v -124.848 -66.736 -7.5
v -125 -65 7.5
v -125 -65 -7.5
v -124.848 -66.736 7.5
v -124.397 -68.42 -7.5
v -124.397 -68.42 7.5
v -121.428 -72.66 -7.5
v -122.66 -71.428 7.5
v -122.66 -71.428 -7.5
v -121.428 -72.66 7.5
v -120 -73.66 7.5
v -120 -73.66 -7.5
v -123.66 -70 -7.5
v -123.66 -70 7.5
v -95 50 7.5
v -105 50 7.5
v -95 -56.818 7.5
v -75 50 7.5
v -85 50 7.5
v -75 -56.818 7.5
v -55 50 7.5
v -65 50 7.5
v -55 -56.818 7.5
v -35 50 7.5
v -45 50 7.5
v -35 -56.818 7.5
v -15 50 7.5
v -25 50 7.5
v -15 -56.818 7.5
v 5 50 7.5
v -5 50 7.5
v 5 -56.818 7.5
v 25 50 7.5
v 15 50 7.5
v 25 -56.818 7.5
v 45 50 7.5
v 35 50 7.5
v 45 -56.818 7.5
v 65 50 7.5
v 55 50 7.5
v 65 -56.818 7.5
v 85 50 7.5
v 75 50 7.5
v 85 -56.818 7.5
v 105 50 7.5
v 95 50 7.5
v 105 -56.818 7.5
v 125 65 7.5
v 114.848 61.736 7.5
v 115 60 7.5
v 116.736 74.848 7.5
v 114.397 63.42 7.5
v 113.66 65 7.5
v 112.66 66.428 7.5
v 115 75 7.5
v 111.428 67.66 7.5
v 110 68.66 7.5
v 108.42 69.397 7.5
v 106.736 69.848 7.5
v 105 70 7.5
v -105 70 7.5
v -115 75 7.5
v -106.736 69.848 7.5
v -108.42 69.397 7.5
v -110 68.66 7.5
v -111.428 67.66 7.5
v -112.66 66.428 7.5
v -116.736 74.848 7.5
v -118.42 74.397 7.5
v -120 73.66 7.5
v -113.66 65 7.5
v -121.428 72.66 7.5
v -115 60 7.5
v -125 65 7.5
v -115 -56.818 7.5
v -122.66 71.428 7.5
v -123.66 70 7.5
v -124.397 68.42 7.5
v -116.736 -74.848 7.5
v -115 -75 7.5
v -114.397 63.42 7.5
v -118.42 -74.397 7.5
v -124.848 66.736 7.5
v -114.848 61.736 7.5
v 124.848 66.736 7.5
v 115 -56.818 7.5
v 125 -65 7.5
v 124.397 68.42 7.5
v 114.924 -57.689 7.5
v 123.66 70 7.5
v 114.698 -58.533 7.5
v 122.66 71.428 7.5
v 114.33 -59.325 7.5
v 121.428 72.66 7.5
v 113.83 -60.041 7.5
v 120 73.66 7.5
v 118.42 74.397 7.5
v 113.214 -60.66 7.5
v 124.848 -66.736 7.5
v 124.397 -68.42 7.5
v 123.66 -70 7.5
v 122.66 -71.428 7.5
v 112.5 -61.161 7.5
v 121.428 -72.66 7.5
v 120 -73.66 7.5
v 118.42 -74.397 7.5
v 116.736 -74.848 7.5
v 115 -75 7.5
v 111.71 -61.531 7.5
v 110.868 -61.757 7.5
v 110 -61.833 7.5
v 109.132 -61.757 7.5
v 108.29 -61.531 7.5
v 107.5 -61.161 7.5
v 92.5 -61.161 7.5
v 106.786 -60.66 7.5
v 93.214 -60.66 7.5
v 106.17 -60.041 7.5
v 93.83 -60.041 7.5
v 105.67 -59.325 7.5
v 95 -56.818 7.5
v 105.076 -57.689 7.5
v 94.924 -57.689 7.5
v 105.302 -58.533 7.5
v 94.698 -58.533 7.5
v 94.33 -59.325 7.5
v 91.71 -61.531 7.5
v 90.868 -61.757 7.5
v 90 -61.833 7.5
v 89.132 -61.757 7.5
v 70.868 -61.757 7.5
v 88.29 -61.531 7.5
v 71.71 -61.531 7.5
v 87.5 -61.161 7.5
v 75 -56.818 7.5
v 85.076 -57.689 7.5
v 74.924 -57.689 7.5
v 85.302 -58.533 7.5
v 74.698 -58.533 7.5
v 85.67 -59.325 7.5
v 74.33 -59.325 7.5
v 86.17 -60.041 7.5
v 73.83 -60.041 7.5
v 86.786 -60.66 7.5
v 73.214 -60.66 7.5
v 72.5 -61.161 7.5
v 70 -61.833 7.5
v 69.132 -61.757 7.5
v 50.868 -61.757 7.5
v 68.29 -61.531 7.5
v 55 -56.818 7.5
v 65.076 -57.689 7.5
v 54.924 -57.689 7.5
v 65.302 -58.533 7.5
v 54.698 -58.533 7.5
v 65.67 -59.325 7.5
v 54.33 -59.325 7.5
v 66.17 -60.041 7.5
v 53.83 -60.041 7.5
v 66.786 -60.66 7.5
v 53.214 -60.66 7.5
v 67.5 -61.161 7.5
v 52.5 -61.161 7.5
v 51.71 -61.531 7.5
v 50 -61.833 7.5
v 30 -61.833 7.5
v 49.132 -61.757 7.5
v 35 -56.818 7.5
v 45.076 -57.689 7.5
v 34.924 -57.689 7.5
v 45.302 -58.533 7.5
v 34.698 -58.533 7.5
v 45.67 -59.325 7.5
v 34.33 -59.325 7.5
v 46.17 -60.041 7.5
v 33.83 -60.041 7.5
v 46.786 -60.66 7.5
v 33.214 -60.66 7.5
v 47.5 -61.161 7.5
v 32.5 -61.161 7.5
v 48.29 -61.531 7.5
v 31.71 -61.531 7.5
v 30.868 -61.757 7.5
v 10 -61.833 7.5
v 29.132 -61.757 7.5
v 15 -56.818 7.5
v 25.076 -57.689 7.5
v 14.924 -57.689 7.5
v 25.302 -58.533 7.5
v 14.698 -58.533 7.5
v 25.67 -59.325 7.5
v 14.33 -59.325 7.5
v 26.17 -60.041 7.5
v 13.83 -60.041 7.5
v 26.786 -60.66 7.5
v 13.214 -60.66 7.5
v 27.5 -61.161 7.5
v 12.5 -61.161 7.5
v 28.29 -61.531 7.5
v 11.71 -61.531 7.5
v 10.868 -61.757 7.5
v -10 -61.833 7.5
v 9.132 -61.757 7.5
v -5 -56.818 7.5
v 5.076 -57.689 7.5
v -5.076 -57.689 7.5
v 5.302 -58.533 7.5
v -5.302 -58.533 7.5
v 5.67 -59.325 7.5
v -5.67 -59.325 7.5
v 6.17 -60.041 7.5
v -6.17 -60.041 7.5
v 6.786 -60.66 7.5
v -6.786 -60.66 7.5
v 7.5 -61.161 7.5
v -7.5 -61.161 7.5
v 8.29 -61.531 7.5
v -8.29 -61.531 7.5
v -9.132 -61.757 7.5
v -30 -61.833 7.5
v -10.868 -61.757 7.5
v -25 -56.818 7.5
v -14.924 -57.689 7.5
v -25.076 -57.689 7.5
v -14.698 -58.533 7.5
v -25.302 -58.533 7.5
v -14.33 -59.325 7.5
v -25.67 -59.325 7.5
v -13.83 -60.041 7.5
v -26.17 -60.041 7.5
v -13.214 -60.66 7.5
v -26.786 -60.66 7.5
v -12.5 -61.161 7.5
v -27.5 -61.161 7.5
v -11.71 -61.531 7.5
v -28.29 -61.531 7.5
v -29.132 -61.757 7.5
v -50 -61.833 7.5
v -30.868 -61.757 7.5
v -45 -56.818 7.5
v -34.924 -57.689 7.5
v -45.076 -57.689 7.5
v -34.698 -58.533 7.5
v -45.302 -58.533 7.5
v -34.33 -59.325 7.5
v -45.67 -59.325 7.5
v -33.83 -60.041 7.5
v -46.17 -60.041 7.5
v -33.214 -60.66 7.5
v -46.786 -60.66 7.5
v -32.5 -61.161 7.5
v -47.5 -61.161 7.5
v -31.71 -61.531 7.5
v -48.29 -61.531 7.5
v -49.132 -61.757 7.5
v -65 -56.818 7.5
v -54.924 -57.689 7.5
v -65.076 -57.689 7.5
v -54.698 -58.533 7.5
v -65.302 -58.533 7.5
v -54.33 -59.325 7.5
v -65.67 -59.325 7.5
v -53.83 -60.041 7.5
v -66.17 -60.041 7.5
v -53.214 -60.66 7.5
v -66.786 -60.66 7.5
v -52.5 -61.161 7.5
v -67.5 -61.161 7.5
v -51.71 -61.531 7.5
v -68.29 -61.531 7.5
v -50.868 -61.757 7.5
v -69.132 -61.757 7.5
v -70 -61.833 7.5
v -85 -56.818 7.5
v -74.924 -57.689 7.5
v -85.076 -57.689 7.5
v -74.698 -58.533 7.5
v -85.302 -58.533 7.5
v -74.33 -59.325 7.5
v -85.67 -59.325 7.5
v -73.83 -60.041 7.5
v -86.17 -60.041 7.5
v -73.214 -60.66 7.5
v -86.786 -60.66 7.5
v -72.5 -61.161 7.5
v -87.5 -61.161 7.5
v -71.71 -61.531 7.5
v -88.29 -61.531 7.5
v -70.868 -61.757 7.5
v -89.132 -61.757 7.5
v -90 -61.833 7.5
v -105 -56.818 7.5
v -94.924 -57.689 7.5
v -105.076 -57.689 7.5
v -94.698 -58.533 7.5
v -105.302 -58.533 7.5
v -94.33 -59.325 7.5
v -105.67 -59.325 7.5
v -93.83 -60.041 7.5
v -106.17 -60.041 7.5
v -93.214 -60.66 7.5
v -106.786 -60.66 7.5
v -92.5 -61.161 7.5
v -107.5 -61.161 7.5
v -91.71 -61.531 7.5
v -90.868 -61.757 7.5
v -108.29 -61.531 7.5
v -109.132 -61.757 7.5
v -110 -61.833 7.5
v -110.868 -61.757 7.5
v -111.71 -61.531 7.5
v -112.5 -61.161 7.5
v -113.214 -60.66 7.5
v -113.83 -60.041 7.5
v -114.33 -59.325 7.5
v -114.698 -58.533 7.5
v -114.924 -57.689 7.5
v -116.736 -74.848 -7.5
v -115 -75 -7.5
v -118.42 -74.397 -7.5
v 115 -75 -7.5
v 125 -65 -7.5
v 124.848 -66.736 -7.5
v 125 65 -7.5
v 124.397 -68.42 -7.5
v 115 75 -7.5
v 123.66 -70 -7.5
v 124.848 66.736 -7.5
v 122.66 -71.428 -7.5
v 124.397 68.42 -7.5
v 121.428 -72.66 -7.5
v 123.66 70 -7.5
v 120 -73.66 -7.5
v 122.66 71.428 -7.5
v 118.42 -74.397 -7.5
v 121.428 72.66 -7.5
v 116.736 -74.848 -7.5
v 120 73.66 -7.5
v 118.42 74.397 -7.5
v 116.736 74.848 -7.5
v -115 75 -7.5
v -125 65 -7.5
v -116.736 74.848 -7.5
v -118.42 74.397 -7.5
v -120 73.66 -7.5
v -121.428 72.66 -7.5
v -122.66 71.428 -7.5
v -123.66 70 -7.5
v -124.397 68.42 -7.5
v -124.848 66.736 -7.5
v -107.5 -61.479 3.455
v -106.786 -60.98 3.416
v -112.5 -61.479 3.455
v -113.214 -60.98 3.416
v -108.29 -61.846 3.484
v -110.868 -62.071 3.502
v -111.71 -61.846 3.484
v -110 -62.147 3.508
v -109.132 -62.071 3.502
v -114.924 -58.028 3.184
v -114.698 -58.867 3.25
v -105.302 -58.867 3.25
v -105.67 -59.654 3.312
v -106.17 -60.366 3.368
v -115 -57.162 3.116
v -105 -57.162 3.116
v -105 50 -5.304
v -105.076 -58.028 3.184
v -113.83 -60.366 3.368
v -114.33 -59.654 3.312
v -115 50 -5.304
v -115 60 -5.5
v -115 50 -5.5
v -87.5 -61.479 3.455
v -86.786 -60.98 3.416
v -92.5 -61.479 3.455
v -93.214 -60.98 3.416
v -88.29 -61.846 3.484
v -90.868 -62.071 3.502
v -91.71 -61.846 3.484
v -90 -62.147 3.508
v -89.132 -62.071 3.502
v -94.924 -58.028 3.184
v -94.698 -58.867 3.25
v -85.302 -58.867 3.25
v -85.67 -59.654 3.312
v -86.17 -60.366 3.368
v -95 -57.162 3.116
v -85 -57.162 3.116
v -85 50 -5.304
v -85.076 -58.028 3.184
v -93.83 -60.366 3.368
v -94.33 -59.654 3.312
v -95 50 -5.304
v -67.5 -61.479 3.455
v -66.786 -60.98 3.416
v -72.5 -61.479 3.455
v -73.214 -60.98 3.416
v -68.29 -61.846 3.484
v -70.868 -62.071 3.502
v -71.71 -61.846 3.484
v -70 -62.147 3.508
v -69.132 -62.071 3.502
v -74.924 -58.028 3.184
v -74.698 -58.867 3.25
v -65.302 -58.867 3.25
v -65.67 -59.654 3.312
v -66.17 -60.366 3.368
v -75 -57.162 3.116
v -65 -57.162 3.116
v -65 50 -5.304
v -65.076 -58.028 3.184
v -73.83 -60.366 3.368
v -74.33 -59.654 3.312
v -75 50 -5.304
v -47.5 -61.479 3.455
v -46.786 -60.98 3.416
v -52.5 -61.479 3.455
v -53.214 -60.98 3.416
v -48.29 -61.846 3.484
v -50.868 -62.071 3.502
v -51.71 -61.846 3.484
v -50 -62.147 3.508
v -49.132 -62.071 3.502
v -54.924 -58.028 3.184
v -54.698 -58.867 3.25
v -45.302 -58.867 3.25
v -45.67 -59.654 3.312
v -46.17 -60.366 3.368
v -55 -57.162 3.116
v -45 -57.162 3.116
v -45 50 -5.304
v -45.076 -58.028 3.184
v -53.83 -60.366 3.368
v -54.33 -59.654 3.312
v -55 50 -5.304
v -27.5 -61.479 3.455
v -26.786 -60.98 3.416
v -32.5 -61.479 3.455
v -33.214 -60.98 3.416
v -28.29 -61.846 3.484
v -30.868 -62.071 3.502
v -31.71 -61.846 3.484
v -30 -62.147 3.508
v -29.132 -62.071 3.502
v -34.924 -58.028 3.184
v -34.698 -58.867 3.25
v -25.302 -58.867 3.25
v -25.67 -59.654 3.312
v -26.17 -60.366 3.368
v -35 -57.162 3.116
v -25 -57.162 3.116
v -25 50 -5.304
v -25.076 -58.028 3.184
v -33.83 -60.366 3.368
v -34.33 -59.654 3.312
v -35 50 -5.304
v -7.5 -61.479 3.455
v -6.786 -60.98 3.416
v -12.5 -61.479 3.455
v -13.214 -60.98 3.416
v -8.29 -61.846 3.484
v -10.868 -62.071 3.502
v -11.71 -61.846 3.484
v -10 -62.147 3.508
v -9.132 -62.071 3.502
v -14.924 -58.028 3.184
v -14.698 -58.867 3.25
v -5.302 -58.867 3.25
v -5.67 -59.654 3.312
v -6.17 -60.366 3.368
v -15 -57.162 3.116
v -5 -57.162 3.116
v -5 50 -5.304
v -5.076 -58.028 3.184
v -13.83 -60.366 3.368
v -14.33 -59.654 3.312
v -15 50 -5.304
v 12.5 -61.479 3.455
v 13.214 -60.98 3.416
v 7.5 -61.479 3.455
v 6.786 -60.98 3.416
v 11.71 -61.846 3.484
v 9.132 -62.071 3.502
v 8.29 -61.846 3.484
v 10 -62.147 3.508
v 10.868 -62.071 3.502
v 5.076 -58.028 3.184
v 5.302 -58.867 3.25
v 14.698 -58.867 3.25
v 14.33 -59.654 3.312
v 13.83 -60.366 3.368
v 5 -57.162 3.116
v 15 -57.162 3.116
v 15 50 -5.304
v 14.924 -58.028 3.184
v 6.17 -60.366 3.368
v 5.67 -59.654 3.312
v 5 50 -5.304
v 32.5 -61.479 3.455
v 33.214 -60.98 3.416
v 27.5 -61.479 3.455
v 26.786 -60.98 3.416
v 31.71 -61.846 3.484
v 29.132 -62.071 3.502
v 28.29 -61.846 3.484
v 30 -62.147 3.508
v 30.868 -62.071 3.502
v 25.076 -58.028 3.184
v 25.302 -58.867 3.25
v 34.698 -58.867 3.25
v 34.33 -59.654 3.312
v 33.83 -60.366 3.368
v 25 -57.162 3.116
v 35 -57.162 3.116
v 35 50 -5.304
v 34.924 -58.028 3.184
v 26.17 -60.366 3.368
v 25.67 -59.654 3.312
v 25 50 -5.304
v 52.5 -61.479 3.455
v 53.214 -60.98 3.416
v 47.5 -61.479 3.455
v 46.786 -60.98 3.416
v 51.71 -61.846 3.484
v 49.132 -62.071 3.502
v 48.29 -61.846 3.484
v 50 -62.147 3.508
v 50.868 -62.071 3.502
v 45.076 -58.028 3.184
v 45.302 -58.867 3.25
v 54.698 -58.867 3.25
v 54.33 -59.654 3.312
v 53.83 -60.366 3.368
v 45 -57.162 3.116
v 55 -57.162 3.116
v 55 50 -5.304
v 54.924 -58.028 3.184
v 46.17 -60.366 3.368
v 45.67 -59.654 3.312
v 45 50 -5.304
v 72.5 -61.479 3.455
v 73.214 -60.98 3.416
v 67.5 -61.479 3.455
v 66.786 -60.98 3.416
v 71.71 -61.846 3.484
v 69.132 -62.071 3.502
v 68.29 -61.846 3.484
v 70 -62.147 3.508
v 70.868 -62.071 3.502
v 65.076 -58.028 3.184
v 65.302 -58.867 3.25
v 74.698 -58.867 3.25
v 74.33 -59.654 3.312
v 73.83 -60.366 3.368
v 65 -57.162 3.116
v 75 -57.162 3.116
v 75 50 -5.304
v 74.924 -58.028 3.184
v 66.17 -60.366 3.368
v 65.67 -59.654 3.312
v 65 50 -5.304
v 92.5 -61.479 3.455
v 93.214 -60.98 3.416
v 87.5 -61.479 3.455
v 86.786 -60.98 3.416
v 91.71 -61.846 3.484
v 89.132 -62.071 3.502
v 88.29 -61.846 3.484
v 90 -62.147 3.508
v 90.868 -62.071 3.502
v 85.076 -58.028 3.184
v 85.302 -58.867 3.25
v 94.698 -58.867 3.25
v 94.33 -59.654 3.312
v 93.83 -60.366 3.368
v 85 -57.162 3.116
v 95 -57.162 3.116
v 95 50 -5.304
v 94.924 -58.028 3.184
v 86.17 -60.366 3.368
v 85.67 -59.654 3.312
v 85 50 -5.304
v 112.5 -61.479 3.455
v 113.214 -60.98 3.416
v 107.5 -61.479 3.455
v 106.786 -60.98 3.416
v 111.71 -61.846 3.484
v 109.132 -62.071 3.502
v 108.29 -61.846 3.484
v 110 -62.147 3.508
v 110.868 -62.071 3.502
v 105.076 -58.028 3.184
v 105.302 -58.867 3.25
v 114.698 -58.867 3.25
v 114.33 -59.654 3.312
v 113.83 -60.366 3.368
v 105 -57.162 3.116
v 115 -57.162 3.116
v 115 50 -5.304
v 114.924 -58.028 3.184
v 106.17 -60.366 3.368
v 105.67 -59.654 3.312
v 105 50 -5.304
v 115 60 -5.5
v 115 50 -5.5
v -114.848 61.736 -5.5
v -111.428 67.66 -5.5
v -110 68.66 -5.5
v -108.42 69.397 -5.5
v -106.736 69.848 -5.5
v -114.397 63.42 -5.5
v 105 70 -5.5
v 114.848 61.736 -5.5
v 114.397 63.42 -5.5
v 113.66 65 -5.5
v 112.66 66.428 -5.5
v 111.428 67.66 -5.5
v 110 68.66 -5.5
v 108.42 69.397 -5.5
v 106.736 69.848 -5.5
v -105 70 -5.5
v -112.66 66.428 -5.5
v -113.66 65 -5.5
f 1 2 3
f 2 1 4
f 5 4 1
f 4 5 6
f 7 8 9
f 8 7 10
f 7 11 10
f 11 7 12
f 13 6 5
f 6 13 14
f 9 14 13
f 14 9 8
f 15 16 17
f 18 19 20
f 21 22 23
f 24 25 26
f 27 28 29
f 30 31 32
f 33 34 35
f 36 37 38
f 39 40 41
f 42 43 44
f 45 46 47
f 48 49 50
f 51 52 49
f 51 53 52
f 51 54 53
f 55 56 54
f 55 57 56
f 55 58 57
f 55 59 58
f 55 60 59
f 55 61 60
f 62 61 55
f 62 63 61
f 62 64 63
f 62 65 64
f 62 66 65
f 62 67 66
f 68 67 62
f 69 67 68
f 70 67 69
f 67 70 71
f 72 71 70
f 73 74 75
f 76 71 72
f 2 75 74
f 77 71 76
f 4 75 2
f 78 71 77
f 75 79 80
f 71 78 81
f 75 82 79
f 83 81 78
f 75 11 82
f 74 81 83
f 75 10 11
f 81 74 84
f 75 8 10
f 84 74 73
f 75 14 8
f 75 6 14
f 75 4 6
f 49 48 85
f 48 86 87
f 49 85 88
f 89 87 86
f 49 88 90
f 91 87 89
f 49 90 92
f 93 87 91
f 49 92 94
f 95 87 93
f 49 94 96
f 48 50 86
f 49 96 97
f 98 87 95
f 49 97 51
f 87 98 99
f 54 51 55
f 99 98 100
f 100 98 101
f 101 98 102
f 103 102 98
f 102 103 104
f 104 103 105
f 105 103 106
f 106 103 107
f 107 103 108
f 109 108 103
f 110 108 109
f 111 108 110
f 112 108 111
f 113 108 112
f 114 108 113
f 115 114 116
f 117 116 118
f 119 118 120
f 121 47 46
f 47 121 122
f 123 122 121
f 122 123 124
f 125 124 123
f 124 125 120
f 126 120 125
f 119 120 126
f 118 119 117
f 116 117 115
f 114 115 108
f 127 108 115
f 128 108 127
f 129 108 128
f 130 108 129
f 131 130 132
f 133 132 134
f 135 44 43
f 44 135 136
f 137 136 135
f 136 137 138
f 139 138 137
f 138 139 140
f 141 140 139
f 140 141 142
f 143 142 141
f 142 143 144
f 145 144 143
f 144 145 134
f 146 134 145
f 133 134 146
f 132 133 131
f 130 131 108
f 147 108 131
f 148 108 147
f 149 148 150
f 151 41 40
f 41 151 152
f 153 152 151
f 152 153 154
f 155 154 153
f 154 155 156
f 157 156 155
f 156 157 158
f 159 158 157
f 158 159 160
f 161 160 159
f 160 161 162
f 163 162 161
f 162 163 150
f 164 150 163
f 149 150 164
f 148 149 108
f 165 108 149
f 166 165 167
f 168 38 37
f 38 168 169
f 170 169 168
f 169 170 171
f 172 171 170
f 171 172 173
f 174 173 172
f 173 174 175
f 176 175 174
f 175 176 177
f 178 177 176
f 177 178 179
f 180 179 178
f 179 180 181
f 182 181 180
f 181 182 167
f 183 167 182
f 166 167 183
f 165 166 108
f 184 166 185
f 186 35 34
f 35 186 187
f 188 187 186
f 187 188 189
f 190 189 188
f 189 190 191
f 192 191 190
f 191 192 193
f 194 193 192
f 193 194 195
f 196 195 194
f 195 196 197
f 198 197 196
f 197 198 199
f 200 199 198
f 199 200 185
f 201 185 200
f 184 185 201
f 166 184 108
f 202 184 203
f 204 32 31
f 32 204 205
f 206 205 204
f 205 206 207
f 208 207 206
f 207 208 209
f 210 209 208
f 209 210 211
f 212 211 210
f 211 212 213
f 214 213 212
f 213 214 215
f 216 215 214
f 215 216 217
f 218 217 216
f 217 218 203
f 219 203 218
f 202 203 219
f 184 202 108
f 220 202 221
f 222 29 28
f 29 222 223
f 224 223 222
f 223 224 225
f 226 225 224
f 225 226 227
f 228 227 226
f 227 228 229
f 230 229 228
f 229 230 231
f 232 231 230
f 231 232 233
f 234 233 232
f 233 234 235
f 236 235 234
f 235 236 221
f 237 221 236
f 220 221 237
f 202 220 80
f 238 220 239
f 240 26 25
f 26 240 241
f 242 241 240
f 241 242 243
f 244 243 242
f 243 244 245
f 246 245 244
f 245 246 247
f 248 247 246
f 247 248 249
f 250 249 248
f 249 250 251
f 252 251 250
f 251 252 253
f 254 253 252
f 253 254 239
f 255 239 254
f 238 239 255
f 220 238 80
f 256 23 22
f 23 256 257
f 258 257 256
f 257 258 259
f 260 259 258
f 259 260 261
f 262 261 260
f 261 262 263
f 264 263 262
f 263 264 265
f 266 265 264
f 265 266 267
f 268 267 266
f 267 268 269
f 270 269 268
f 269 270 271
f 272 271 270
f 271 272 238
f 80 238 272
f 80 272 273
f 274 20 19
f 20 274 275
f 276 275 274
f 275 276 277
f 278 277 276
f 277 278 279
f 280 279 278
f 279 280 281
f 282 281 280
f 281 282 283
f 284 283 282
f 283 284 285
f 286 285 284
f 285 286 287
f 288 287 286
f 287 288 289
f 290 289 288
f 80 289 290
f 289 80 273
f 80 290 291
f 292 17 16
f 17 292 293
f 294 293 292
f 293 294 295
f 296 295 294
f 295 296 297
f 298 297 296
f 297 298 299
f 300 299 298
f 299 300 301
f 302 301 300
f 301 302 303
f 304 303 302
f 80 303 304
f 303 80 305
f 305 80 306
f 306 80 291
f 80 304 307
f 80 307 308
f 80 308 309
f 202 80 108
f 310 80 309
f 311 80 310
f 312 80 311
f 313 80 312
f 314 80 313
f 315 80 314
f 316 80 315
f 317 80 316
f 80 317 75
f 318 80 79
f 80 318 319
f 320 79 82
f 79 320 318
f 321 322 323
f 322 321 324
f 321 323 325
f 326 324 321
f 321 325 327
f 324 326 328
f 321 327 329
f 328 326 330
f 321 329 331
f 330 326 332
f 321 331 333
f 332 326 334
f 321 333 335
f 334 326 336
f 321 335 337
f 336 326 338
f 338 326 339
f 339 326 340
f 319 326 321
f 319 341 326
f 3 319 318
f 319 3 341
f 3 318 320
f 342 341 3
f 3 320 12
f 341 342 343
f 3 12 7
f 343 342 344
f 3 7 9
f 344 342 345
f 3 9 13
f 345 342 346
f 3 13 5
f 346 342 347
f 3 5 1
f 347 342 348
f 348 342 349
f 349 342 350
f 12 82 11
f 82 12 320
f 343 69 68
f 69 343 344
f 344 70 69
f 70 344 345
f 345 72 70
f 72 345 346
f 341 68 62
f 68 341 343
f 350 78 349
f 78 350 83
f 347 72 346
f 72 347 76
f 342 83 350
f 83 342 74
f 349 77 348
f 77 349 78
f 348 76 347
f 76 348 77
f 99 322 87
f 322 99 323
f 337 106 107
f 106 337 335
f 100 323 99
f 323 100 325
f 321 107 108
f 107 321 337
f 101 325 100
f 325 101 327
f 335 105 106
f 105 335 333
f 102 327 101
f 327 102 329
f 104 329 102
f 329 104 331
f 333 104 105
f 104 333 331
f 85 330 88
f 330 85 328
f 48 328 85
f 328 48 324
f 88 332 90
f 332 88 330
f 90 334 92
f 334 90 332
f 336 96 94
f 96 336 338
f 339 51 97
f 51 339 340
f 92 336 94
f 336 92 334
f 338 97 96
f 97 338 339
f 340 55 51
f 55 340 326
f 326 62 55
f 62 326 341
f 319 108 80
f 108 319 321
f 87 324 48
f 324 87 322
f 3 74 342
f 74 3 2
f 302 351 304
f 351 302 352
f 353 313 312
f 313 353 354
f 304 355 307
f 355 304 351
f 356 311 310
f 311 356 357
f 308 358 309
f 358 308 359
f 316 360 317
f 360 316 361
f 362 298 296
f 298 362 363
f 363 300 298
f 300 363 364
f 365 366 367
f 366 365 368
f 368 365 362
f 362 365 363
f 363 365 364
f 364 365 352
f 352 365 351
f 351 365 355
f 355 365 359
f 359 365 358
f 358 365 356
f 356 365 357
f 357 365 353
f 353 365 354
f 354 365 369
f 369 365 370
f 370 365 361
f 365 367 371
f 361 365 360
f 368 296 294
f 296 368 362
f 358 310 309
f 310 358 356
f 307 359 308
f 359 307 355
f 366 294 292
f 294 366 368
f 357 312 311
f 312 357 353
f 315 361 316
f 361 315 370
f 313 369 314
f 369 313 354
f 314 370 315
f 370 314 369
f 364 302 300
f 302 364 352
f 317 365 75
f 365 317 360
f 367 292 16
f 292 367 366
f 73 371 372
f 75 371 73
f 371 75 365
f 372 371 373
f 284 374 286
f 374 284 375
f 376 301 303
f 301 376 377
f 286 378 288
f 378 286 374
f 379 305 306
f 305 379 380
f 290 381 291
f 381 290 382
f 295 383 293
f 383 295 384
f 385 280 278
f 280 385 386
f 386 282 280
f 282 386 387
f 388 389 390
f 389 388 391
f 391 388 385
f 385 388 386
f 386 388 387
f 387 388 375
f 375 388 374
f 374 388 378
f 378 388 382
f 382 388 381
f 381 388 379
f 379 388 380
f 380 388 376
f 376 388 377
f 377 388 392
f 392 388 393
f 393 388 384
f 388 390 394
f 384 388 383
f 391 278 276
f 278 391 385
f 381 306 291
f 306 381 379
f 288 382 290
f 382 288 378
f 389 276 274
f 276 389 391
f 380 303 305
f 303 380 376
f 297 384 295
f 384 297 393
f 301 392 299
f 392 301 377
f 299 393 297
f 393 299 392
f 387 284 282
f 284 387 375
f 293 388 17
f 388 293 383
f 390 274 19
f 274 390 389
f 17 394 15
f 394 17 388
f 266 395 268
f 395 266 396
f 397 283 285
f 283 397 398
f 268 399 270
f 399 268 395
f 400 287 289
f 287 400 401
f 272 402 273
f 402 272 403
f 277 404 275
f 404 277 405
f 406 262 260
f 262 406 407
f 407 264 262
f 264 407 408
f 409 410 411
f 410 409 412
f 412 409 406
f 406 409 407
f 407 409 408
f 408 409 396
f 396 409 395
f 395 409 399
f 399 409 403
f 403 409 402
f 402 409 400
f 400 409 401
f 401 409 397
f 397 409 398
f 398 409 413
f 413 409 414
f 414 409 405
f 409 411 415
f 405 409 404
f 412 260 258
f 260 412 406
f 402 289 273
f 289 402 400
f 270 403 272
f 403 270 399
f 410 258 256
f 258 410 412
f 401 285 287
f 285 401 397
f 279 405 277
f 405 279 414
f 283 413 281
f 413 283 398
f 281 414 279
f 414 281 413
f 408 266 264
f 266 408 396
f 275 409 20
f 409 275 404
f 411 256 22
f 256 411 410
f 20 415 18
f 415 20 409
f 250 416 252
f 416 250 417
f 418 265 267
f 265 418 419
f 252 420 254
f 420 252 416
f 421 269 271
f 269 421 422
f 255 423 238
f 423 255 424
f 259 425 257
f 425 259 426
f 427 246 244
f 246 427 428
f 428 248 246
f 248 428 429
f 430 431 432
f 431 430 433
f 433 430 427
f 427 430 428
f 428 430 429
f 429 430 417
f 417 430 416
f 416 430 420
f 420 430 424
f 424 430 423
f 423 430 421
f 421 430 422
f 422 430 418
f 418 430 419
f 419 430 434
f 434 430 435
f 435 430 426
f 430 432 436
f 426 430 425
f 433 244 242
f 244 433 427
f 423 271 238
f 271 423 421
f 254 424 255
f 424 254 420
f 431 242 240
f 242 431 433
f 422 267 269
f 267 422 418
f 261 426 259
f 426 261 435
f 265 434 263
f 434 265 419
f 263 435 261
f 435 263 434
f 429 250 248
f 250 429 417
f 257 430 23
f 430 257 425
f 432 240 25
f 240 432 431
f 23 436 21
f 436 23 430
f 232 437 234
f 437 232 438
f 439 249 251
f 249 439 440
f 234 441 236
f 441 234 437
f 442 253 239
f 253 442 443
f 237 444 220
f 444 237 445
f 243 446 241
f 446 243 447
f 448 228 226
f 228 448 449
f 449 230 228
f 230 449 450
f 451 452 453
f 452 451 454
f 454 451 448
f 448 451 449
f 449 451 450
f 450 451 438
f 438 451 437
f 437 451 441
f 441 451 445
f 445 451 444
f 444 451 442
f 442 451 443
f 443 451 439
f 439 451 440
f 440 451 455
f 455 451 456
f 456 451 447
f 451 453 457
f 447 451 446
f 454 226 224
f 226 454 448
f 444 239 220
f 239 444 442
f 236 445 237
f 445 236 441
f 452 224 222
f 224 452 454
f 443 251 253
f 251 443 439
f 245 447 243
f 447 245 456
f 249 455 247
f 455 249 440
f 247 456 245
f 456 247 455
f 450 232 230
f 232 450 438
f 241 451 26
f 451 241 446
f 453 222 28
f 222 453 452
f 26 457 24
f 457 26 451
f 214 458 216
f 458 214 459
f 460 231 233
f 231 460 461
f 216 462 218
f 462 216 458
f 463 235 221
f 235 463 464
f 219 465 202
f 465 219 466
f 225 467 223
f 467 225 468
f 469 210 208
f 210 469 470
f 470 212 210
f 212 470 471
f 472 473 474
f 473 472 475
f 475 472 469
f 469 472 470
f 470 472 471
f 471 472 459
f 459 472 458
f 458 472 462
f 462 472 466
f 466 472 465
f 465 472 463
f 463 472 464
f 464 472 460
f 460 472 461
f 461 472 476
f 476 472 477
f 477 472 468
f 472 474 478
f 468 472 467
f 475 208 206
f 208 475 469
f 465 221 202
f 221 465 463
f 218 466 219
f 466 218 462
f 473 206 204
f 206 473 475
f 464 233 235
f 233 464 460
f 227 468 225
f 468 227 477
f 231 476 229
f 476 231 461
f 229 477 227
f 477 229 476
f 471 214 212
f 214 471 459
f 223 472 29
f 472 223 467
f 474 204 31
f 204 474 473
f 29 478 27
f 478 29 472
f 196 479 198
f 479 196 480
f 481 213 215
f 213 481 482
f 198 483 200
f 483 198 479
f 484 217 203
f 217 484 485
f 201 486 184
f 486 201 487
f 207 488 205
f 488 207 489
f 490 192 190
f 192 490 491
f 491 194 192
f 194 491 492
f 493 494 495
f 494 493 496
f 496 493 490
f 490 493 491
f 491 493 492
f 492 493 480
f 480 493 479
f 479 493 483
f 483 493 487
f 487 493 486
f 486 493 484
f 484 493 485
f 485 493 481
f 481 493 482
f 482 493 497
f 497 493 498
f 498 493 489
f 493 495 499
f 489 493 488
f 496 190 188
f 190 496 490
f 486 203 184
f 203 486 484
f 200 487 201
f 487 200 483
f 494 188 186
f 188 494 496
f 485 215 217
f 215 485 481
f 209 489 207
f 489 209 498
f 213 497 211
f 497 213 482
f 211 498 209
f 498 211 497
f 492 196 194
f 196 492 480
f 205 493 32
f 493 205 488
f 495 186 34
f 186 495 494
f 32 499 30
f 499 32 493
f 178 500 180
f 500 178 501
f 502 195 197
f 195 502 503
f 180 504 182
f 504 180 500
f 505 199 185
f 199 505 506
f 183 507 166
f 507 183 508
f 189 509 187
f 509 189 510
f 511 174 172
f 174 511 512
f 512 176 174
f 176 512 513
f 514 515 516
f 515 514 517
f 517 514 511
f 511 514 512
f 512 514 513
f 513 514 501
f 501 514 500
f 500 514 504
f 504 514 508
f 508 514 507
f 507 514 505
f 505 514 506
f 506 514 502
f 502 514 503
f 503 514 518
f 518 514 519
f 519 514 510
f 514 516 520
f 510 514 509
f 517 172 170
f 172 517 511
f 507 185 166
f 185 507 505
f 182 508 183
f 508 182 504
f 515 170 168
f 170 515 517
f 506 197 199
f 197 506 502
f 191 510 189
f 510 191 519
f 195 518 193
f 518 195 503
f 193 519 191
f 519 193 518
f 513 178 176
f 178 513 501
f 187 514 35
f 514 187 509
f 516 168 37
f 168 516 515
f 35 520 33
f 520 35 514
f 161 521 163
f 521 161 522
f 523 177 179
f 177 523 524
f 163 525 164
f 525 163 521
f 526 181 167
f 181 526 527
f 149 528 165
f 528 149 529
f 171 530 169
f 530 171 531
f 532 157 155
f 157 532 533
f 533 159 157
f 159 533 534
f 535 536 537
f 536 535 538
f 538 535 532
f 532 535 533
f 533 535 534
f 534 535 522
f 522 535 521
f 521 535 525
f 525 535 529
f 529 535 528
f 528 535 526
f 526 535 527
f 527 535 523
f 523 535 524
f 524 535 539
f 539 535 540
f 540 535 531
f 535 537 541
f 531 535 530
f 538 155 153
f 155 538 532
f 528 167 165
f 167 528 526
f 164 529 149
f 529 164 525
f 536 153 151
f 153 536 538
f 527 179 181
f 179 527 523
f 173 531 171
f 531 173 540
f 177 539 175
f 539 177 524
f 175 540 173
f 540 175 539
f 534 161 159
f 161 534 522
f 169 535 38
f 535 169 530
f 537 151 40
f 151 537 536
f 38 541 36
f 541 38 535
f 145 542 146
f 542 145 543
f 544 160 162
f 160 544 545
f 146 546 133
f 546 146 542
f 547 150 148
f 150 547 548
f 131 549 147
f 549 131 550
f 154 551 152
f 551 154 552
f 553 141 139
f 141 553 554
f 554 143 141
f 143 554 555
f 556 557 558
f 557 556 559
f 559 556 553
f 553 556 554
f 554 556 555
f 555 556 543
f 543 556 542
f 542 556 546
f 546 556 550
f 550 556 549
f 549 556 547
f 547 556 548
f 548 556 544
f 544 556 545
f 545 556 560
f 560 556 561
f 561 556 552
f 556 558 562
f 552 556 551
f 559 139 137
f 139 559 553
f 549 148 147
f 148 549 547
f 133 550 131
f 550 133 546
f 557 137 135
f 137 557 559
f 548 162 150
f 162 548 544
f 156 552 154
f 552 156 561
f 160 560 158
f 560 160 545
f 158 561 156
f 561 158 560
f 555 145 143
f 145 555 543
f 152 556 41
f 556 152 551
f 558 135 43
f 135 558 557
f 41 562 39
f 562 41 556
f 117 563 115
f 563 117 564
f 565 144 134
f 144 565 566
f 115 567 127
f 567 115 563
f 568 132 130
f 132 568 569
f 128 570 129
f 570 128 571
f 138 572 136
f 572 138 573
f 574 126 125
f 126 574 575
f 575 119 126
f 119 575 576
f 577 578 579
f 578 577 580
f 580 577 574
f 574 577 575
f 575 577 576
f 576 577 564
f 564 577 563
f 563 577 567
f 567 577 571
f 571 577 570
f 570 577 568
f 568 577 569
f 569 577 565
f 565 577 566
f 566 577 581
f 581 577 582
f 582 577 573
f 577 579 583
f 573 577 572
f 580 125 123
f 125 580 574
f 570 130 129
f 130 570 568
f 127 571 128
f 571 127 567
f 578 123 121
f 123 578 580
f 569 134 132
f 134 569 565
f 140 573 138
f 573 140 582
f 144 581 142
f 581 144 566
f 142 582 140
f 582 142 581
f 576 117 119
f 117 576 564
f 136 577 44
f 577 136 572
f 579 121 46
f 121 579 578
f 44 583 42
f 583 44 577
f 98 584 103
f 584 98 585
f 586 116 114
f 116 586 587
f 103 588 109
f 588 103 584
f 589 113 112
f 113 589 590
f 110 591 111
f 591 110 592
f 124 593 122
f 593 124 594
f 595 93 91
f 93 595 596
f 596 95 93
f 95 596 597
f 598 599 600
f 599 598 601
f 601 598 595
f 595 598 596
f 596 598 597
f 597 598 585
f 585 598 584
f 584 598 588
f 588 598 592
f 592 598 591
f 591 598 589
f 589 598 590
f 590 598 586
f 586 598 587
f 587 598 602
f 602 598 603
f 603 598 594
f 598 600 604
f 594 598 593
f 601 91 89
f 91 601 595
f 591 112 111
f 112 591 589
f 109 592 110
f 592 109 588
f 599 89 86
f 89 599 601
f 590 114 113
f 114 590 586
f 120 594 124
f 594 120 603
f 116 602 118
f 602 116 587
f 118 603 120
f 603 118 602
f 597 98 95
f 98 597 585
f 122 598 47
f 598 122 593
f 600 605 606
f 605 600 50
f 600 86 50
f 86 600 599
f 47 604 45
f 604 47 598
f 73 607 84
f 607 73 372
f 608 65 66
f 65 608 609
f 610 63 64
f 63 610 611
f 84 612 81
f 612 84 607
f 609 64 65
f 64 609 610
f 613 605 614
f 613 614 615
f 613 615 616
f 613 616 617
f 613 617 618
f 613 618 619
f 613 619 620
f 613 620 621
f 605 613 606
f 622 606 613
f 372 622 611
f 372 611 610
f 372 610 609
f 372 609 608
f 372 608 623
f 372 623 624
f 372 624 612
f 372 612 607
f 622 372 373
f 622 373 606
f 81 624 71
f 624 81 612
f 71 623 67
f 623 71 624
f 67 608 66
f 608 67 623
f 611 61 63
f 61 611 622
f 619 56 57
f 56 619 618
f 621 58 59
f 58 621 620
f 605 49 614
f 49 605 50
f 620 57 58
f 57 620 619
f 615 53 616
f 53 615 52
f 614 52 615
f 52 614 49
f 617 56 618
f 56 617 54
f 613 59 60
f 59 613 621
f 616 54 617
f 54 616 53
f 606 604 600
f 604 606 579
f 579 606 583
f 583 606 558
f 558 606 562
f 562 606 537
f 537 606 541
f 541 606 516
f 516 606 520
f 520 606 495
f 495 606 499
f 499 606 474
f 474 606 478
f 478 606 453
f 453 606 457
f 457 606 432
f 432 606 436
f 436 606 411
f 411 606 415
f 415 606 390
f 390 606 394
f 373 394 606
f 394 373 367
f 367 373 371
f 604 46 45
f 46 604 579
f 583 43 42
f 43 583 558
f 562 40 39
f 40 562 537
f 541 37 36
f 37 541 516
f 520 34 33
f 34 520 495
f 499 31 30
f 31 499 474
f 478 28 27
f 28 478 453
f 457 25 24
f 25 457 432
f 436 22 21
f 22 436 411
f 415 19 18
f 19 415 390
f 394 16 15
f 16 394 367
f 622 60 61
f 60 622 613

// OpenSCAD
/*
Customizable Kitchen Drip Tray
<<Dedalo>>


This program is free software: you can redistribute it and/or modify
it under the terms of the GNU General Public License as published by
the Free Software Foundation, either version 3 of the License, or
(at your option) any later version.

This program is distributed in the hope that it will be useful,
but WITHOUT ANY WARRANTY; without even the implied warranty of
MERCHANTABILITY or FITNESS FOR A PARTICULAR PURPOSE.  See the
GNU General Public License for more details.

You should have received a copy of the GNU General Public License
along with this program.  If not, see <http://www.gnu.org/licenses/>.
*/




//Customizable Kitchen Drip Tray
include <MCAD/boxes.scad>
/* [Drainer Dimensions] */
//Width
Width = 150;

//Drainer
DrainerWidth=10;

//Quantity of Drainers
Qtty = 24;


/* [Water deposit] */
// Width of water deposit (0= no deposit, must be larger than 2*DrainerWidth)
WDSize=20;

/* [Hidden] */
//Width
Length=DrainerWidth*(Qtty+1);

//Height
Height=15;
//Floor thickness
minthickness=2;


radius = DrainerWidth;

dividerCount = Length/DrainerWidth;

drainerLength = WDSize?Width - 1.5*DrainerWidth - WDSize : Width - DrainerWidth;

angle = atan((Height-(minthickness*2))/(Width-DrainerWidth));
echo("Angle:",angle);

body();

//roundedStick([DrainerWidth,drainerLength,Height], radius/2, 1, $fn=36);
//deposit();

module roundedStick(size, r, sidesonly)
{
  if (sidesonly) {
	y = (r-size[1])/2;
	translate([0,r/2,0])union(){
		cube(size - [2*r,0,0], true);
		cube(size - [0,r,0], true);
		for (x = [r-size[0]/2, -r+size[0]/2]) {
		  translate([x,y,0]) cylinder(r=r, h=size[2], center=true);
		}
	}
  }
}


module deposit(){
	rotate([180,0,0])union(){
		depositSize=[Length-(DrainerWidth*2),WDSize,Height];
		roundedBox(depositSize,radius,1, $fn=36);
		translate([0,radius/2,0])cube(depositSize - [0,radius,0], true);
	}
}


module drainer(){
	rotate([-angle,0,0])translate([0,-drainerLength/2,(Height)/2])roundedStick([DrainerWidth,drainerLength,Height], radius/2, 1, $fn=36);
}

module body() {
	echo("Number of dividers:",dividerCount);
	difference() {
		// base
		roundedBox([Length,Width,Height], radius, 1, $fn=36);
		// drainers
		for (sep=[1:dividerCount/2]) {
			if(WDSize){
				translate([sep*DrainerWidth*2-Length/2-DrainerWidth/2,(drainerLength-DrainerWidth)/2,minthickness-Height/2])drainer();
			}else{
				translate([sep*DrainerWidth*2-Length/2-DrainerWidth/2,(drainerLength+DrainerWidth)/2,minthickness-Height/2])drainer();
			}
		}
		
		if(WDSize){
			translate([0,(Width-WDSize-DrainerWidth)/2,minthickness])deposit();
		}
	}
	
}
